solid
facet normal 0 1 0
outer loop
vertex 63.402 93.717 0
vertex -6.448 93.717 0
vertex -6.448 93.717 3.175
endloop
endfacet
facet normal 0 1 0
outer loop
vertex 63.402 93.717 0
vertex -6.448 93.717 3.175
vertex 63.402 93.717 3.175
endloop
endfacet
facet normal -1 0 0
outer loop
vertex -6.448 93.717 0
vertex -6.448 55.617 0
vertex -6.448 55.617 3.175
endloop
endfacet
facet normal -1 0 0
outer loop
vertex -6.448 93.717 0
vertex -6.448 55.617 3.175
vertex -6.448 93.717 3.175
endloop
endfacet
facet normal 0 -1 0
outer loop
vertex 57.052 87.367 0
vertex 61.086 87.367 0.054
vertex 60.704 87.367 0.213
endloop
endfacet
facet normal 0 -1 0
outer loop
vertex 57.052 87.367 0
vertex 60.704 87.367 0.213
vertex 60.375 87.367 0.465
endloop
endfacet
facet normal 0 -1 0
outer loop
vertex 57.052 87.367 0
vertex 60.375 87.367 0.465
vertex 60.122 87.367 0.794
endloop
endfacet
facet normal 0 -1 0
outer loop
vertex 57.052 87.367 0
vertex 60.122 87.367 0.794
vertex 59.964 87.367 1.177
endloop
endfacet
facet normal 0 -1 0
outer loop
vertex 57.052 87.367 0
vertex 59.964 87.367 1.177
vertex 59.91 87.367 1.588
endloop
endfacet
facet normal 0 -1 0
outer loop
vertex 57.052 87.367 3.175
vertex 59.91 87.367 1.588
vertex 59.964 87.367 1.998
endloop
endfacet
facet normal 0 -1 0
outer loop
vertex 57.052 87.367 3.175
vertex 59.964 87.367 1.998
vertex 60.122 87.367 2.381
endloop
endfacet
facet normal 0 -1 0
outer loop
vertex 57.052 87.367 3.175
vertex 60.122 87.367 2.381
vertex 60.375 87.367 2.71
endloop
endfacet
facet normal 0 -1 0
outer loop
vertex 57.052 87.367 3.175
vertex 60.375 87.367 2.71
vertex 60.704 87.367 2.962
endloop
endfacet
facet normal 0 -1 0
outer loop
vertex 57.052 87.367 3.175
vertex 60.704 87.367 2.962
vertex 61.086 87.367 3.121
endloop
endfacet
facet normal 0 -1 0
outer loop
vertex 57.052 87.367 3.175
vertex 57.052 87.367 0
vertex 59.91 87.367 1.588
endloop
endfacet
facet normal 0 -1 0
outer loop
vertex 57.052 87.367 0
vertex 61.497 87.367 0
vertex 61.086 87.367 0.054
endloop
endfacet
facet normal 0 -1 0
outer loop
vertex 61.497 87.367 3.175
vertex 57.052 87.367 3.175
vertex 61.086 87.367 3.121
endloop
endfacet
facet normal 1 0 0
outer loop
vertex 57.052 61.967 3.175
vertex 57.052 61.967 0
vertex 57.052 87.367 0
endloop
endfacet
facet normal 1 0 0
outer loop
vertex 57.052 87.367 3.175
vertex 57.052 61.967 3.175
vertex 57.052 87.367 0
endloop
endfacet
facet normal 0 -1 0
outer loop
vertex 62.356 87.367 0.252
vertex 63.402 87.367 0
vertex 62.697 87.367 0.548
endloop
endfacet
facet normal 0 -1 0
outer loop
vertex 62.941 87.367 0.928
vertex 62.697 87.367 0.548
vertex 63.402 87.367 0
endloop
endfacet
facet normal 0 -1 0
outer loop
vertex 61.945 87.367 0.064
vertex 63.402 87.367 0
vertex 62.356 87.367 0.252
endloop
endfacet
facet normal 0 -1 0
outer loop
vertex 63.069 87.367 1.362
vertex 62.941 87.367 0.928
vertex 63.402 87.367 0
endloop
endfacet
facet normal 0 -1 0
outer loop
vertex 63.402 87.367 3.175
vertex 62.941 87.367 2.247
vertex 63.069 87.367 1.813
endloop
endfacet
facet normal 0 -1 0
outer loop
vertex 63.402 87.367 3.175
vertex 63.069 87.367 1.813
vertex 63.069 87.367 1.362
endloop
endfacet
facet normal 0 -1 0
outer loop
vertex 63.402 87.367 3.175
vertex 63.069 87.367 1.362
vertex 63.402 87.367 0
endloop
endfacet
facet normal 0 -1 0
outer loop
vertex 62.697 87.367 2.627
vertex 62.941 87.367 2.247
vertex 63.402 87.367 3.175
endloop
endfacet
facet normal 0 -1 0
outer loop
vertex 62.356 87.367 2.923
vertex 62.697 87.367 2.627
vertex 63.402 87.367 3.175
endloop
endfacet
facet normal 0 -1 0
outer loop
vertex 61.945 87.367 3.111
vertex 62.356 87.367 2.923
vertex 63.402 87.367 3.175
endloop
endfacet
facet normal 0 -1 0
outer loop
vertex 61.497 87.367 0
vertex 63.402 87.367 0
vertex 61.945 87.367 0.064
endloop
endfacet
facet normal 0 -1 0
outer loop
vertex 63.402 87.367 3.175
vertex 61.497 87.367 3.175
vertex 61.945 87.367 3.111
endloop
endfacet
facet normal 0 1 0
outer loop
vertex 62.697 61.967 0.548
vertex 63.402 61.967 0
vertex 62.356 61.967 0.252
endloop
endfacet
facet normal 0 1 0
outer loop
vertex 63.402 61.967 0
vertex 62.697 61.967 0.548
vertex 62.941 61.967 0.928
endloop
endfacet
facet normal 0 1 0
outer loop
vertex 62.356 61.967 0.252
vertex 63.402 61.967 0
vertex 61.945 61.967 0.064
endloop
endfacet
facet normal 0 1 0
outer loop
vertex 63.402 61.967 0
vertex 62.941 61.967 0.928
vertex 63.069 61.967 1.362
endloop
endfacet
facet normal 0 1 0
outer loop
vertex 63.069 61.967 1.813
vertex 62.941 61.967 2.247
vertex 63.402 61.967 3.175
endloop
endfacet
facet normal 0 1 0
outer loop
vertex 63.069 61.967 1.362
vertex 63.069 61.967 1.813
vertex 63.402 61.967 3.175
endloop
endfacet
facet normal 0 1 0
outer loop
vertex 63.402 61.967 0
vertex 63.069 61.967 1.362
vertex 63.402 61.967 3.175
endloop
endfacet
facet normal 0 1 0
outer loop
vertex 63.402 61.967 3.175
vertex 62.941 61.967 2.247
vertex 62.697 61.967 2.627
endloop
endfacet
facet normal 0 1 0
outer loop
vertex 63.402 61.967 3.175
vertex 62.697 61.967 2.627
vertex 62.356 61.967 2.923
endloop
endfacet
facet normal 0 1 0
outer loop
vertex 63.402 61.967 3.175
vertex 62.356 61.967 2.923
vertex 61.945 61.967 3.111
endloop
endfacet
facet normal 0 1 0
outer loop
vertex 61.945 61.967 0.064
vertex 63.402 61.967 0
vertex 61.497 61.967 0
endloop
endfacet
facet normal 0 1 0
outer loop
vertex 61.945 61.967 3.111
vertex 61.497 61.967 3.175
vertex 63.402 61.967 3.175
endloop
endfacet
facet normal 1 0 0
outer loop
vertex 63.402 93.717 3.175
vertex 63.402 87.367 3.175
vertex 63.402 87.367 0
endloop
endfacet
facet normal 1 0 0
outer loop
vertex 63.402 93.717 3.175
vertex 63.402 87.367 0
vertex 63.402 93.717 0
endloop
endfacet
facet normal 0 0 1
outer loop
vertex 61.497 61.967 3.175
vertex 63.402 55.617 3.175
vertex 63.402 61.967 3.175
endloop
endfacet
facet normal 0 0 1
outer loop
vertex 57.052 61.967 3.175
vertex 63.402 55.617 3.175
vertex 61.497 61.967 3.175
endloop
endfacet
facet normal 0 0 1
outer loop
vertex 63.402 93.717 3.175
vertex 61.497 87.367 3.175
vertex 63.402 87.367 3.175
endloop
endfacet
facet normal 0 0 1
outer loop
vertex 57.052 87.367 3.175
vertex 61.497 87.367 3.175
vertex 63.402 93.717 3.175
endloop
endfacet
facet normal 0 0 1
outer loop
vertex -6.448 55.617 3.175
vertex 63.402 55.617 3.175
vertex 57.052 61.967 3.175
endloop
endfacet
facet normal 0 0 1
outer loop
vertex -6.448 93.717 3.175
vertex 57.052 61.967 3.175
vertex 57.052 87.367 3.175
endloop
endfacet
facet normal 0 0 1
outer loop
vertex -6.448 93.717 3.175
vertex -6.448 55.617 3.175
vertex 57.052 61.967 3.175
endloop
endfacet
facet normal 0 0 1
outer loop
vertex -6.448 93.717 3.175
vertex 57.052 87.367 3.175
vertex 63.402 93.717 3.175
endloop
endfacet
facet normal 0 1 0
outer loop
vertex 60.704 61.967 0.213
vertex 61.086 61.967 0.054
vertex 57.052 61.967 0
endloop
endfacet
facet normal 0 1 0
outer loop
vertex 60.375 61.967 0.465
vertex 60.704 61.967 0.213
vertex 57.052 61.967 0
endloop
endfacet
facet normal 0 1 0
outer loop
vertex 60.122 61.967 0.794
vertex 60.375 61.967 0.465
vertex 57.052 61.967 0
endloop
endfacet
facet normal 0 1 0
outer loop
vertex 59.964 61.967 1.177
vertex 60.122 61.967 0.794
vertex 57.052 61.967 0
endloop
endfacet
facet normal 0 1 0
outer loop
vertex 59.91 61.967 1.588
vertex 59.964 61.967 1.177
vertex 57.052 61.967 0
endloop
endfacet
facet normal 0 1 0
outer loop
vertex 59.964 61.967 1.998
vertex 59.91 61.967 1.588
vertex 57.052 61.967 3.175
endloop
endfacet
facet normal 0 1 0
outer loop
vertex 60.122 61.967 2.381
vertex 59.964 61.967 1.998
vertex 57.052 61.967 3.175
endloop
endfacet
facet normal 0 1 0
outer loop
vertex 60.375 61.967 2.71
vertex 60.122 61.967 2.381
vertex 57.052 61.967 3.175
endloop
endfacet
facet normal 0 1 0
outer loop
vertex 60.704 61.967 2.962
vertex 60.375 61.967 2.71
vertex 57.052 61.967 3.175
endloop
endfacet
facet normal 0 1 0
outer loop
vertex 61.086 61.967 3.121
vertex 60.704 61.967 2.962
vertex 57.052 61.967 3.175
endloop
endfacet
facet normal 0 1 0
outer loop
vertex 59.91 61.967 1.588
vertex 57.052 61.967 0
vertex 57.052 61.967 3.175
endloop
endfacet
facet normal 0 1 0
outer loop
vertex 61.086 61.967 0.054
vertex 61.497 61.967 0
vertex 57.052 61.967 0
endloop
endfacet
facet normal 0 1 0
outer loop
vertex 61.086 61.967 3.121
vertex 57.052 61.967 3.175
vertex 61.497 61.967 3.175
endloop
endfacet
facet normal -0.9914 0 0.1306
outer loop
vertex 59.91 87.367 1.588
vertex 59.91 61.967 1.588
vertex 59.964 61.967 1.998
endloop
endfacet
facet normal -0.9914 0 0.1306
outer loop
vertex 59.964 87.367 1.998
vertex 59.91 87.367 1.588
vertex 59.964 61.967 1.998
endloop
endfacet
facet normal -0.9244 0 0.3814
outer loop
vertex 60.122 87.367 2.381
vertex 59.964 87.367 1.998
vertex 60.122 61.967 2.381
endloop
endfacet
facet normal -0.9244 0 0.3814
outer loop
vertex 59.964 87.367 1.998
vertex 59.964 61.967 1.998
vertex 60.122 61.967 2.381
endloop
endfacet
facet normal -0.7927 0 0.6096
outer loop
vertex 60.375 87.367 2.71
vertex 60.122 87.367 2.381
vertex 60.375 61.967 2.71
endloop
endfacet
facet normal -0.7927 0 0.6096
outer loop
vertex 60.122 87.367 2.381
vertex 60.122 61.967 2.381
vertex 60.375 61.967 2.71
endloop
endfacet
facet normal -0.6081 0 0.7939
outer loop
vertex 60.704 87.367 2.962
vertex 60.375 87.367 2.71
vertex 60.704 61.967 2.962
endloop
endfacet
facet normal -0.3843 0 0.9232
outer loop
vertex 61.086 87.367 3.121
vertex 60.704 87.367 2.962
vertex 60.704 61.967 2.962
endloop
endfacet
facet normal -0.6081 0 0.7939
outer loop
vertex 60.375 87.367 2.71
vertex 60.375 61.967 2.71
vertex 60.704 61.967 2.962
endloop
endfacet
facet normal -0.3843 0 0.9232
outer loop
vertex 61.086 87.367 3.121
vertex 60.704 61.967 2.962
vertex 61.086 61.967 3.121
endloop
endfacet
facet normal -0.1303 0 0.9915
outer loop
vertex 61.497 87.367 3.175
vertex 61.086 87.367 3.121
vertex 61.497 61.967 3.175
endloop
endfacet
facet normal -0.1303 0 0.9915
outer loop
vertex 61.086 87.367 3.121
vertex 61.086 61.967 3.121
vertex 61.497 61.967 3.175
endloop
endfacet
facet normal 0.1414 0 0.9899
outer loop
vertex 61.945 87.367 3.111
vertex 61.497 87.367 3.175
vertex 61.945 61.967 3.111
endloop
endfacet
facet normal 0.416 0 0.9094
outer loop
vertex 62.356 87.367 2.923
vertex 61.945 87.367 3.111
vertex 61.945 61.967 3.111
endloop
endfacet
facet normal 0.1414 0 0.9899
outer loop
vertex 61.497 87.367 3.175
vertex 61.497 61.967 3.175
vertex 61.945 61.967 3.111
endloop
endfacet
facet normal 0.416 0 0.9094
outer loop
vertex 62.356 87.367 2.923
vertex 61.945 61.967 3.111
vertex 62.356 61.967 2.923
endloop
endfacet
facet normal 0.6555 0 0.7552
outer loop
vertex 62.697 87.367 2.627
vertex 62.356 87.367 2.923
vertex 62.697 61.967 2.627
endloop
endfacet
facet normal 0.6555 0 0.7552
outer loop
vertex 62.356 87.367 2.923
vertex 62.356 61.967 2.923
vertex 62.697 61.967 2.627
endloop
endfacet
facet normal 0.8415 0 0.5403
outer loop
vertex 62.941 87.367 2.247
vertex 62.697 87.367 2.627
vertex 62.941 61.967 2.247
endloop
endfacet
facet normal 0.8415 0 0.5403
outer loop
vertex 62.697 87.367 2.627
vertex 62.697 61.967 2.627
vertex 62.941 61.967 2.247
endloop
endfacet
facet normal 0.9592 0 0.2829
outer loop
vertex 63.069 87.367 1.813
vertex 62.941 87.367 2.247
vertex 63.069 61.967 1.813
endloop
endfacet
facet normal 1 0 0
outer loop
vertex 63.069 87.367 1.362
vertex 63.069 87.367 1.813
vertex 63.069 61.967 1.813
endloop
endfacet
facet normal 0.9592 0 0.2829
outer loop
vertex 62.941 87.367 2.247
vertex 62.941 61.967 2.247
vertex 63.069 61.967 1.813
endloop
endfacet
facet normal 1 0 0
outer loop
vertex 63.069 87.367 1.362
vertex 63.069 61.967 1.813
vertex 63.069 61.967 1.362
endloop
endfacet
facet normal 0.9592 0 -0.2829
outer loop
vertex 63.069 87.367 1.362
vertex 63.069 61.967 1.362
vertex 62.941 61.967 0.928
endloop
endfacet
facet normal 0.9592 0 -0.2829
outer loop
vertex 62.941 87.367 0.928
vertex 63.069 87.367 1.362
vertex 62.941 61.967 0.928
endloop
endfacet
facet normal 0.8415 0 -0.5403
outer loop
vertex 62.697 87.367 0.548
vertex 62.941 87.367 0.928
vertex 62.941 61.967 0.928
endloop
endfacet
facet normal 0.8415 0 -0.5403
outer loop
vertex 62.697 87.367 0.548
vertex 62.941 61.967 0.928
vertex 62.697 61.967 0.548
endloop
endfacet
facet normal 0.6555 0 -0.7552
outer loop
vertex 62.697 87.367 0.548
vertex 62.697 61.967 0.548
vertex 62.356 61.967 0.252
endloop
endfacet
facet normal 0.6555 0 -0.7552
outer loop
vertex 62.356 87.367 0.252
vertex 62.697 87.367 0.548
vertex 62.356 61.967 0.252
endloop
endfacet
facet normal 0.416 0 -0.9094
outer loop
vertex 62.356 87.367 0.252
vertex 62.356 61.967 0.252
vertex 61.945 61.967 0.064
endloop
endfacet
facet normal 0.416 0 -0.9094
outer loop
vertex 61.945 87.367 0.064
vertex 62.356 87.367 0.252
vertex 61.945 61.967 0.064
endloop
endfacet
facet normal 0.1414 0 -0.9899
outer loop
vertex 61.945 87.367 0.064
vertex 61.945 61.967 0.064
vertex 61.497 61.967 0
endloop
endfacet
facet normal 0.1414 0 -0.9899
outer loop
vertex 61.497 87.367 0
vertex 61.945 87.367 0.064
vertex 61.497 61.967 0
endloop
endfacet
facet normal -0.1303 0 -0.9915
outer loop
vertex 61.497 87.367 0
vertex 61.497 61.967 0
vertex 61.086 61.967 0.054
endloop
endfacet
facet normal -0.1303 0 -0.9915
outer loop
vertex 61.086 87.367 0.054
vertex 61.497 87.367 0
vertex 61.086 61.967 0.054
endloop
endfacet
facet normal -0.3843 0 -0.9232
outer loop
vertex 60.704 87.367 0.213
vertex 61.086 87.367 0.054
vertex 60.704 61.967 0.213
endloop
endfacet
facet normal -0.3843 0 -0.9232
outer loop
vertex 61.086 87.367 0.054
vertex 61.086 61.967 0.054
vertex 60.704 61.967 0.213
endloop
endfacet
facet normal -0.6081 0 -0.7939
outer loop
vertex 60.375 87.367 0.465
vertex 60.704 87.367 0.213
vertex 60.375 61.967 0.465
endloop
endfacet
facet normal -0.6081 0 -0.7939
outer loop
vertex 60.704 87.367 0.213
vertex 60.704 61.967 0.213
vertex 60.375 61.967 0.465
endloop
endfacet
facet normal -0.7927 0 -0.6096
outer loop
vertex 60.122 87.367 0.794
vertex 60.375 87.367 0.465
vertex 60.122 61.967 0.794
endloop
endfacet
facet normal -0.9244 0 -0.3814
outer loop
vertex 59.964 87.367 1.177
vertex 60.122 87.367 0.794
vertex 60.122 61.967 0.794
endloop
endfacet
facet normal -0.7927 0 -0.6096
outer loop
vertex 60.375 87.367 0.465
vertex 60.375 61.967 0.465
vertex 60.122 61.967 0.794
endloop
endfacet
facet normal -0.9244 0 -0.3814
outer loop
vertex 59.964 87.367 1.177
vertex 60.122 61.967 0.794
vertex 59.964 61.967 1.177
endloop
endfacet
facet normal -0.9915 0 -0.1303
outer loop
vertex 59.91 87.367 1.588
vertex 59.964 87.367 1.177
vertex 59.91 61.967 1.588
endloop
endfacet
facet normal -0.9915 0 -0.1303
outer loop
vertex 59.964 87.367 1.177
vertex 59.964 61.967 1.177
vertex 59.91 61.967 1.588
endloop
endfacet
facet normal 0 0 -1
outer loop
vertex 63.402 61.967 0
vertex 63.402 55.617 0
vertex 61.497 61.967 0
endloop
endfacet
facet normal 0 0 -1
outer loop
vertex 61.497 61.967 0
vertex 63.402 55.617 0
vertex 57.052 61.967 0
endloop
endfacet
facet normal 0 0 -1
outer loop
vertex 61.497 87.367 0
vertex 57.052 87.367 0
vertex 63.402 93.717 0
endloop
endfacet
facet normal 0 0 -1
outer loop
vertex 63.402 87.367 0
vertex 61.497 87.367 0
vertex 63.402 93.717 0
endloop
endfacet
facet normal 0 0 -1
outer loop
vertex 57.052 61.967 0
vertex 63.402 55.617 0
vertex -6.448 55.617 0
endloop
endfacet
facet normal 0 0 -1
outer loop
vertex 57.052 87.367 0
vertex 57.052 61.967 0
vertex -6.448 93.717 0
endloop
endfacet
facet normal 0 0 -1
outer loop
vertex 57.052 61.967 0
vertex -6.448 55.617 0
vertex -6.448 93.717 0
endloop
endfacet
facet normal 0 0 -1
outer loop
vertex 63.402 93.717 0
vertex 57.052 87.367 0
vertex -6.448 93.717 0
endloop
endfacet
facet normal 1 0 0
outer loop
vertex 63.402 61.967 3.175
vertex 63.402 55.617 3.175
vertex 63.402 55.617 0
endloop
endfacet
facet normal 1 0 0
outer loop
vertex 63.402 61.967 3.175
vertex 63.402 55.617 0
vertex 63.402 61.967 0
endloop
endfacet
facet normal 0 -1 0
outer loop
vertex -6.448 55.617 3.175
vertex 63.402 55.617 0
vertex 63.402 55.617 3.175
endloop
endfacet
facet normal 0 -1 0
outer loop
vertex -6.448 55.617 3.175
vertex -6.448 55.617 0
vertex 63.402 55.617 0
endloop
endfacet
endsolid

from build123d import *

# Parameters (mm, degrees)
F0_W     = 63.5
F0_H     = 38.1
F1_DEPTH = 3.175
F2_W     = 6.35
F2_H     = 3.175
F3_DEPTH = 6.35
F4_R     = 1.5875
F5_DEPTH = 25.4


with BuildPart() as f1:
    # F0 (on Top) → F1 (new body)
    with BuildSketch(Plane.XY):
        with Locations((25.302306, 74.666583)):
            Rectangle(F0_W, F0_H)
    extrude(amount=F1_DEPTH)

    # F2 (on face) → F3 (join)
    with BuildSketch(Plane.YZ.offset(57.052306)):
        with Locations((58.791583, 1.5875)):
            Rectangle(F2_W, F2_H)
        with Locations((90.541583, 1.5875)):
            Rectangle(F2_W, F2_H)
    extrude(amount=F3_DEPTH)

    # F4 (on face) → F5 (join)
    with BuildSketch(Plane(origin=(0, 61.966583, 0), x_dir=(-1, 0, 0), z_dir=(0, 1, 0))):
        with Locations((-61.497306, 1.5875)):
            Circle(F4_R)
    extrude(amount=F5_DEPTH)


solid = f1.part
